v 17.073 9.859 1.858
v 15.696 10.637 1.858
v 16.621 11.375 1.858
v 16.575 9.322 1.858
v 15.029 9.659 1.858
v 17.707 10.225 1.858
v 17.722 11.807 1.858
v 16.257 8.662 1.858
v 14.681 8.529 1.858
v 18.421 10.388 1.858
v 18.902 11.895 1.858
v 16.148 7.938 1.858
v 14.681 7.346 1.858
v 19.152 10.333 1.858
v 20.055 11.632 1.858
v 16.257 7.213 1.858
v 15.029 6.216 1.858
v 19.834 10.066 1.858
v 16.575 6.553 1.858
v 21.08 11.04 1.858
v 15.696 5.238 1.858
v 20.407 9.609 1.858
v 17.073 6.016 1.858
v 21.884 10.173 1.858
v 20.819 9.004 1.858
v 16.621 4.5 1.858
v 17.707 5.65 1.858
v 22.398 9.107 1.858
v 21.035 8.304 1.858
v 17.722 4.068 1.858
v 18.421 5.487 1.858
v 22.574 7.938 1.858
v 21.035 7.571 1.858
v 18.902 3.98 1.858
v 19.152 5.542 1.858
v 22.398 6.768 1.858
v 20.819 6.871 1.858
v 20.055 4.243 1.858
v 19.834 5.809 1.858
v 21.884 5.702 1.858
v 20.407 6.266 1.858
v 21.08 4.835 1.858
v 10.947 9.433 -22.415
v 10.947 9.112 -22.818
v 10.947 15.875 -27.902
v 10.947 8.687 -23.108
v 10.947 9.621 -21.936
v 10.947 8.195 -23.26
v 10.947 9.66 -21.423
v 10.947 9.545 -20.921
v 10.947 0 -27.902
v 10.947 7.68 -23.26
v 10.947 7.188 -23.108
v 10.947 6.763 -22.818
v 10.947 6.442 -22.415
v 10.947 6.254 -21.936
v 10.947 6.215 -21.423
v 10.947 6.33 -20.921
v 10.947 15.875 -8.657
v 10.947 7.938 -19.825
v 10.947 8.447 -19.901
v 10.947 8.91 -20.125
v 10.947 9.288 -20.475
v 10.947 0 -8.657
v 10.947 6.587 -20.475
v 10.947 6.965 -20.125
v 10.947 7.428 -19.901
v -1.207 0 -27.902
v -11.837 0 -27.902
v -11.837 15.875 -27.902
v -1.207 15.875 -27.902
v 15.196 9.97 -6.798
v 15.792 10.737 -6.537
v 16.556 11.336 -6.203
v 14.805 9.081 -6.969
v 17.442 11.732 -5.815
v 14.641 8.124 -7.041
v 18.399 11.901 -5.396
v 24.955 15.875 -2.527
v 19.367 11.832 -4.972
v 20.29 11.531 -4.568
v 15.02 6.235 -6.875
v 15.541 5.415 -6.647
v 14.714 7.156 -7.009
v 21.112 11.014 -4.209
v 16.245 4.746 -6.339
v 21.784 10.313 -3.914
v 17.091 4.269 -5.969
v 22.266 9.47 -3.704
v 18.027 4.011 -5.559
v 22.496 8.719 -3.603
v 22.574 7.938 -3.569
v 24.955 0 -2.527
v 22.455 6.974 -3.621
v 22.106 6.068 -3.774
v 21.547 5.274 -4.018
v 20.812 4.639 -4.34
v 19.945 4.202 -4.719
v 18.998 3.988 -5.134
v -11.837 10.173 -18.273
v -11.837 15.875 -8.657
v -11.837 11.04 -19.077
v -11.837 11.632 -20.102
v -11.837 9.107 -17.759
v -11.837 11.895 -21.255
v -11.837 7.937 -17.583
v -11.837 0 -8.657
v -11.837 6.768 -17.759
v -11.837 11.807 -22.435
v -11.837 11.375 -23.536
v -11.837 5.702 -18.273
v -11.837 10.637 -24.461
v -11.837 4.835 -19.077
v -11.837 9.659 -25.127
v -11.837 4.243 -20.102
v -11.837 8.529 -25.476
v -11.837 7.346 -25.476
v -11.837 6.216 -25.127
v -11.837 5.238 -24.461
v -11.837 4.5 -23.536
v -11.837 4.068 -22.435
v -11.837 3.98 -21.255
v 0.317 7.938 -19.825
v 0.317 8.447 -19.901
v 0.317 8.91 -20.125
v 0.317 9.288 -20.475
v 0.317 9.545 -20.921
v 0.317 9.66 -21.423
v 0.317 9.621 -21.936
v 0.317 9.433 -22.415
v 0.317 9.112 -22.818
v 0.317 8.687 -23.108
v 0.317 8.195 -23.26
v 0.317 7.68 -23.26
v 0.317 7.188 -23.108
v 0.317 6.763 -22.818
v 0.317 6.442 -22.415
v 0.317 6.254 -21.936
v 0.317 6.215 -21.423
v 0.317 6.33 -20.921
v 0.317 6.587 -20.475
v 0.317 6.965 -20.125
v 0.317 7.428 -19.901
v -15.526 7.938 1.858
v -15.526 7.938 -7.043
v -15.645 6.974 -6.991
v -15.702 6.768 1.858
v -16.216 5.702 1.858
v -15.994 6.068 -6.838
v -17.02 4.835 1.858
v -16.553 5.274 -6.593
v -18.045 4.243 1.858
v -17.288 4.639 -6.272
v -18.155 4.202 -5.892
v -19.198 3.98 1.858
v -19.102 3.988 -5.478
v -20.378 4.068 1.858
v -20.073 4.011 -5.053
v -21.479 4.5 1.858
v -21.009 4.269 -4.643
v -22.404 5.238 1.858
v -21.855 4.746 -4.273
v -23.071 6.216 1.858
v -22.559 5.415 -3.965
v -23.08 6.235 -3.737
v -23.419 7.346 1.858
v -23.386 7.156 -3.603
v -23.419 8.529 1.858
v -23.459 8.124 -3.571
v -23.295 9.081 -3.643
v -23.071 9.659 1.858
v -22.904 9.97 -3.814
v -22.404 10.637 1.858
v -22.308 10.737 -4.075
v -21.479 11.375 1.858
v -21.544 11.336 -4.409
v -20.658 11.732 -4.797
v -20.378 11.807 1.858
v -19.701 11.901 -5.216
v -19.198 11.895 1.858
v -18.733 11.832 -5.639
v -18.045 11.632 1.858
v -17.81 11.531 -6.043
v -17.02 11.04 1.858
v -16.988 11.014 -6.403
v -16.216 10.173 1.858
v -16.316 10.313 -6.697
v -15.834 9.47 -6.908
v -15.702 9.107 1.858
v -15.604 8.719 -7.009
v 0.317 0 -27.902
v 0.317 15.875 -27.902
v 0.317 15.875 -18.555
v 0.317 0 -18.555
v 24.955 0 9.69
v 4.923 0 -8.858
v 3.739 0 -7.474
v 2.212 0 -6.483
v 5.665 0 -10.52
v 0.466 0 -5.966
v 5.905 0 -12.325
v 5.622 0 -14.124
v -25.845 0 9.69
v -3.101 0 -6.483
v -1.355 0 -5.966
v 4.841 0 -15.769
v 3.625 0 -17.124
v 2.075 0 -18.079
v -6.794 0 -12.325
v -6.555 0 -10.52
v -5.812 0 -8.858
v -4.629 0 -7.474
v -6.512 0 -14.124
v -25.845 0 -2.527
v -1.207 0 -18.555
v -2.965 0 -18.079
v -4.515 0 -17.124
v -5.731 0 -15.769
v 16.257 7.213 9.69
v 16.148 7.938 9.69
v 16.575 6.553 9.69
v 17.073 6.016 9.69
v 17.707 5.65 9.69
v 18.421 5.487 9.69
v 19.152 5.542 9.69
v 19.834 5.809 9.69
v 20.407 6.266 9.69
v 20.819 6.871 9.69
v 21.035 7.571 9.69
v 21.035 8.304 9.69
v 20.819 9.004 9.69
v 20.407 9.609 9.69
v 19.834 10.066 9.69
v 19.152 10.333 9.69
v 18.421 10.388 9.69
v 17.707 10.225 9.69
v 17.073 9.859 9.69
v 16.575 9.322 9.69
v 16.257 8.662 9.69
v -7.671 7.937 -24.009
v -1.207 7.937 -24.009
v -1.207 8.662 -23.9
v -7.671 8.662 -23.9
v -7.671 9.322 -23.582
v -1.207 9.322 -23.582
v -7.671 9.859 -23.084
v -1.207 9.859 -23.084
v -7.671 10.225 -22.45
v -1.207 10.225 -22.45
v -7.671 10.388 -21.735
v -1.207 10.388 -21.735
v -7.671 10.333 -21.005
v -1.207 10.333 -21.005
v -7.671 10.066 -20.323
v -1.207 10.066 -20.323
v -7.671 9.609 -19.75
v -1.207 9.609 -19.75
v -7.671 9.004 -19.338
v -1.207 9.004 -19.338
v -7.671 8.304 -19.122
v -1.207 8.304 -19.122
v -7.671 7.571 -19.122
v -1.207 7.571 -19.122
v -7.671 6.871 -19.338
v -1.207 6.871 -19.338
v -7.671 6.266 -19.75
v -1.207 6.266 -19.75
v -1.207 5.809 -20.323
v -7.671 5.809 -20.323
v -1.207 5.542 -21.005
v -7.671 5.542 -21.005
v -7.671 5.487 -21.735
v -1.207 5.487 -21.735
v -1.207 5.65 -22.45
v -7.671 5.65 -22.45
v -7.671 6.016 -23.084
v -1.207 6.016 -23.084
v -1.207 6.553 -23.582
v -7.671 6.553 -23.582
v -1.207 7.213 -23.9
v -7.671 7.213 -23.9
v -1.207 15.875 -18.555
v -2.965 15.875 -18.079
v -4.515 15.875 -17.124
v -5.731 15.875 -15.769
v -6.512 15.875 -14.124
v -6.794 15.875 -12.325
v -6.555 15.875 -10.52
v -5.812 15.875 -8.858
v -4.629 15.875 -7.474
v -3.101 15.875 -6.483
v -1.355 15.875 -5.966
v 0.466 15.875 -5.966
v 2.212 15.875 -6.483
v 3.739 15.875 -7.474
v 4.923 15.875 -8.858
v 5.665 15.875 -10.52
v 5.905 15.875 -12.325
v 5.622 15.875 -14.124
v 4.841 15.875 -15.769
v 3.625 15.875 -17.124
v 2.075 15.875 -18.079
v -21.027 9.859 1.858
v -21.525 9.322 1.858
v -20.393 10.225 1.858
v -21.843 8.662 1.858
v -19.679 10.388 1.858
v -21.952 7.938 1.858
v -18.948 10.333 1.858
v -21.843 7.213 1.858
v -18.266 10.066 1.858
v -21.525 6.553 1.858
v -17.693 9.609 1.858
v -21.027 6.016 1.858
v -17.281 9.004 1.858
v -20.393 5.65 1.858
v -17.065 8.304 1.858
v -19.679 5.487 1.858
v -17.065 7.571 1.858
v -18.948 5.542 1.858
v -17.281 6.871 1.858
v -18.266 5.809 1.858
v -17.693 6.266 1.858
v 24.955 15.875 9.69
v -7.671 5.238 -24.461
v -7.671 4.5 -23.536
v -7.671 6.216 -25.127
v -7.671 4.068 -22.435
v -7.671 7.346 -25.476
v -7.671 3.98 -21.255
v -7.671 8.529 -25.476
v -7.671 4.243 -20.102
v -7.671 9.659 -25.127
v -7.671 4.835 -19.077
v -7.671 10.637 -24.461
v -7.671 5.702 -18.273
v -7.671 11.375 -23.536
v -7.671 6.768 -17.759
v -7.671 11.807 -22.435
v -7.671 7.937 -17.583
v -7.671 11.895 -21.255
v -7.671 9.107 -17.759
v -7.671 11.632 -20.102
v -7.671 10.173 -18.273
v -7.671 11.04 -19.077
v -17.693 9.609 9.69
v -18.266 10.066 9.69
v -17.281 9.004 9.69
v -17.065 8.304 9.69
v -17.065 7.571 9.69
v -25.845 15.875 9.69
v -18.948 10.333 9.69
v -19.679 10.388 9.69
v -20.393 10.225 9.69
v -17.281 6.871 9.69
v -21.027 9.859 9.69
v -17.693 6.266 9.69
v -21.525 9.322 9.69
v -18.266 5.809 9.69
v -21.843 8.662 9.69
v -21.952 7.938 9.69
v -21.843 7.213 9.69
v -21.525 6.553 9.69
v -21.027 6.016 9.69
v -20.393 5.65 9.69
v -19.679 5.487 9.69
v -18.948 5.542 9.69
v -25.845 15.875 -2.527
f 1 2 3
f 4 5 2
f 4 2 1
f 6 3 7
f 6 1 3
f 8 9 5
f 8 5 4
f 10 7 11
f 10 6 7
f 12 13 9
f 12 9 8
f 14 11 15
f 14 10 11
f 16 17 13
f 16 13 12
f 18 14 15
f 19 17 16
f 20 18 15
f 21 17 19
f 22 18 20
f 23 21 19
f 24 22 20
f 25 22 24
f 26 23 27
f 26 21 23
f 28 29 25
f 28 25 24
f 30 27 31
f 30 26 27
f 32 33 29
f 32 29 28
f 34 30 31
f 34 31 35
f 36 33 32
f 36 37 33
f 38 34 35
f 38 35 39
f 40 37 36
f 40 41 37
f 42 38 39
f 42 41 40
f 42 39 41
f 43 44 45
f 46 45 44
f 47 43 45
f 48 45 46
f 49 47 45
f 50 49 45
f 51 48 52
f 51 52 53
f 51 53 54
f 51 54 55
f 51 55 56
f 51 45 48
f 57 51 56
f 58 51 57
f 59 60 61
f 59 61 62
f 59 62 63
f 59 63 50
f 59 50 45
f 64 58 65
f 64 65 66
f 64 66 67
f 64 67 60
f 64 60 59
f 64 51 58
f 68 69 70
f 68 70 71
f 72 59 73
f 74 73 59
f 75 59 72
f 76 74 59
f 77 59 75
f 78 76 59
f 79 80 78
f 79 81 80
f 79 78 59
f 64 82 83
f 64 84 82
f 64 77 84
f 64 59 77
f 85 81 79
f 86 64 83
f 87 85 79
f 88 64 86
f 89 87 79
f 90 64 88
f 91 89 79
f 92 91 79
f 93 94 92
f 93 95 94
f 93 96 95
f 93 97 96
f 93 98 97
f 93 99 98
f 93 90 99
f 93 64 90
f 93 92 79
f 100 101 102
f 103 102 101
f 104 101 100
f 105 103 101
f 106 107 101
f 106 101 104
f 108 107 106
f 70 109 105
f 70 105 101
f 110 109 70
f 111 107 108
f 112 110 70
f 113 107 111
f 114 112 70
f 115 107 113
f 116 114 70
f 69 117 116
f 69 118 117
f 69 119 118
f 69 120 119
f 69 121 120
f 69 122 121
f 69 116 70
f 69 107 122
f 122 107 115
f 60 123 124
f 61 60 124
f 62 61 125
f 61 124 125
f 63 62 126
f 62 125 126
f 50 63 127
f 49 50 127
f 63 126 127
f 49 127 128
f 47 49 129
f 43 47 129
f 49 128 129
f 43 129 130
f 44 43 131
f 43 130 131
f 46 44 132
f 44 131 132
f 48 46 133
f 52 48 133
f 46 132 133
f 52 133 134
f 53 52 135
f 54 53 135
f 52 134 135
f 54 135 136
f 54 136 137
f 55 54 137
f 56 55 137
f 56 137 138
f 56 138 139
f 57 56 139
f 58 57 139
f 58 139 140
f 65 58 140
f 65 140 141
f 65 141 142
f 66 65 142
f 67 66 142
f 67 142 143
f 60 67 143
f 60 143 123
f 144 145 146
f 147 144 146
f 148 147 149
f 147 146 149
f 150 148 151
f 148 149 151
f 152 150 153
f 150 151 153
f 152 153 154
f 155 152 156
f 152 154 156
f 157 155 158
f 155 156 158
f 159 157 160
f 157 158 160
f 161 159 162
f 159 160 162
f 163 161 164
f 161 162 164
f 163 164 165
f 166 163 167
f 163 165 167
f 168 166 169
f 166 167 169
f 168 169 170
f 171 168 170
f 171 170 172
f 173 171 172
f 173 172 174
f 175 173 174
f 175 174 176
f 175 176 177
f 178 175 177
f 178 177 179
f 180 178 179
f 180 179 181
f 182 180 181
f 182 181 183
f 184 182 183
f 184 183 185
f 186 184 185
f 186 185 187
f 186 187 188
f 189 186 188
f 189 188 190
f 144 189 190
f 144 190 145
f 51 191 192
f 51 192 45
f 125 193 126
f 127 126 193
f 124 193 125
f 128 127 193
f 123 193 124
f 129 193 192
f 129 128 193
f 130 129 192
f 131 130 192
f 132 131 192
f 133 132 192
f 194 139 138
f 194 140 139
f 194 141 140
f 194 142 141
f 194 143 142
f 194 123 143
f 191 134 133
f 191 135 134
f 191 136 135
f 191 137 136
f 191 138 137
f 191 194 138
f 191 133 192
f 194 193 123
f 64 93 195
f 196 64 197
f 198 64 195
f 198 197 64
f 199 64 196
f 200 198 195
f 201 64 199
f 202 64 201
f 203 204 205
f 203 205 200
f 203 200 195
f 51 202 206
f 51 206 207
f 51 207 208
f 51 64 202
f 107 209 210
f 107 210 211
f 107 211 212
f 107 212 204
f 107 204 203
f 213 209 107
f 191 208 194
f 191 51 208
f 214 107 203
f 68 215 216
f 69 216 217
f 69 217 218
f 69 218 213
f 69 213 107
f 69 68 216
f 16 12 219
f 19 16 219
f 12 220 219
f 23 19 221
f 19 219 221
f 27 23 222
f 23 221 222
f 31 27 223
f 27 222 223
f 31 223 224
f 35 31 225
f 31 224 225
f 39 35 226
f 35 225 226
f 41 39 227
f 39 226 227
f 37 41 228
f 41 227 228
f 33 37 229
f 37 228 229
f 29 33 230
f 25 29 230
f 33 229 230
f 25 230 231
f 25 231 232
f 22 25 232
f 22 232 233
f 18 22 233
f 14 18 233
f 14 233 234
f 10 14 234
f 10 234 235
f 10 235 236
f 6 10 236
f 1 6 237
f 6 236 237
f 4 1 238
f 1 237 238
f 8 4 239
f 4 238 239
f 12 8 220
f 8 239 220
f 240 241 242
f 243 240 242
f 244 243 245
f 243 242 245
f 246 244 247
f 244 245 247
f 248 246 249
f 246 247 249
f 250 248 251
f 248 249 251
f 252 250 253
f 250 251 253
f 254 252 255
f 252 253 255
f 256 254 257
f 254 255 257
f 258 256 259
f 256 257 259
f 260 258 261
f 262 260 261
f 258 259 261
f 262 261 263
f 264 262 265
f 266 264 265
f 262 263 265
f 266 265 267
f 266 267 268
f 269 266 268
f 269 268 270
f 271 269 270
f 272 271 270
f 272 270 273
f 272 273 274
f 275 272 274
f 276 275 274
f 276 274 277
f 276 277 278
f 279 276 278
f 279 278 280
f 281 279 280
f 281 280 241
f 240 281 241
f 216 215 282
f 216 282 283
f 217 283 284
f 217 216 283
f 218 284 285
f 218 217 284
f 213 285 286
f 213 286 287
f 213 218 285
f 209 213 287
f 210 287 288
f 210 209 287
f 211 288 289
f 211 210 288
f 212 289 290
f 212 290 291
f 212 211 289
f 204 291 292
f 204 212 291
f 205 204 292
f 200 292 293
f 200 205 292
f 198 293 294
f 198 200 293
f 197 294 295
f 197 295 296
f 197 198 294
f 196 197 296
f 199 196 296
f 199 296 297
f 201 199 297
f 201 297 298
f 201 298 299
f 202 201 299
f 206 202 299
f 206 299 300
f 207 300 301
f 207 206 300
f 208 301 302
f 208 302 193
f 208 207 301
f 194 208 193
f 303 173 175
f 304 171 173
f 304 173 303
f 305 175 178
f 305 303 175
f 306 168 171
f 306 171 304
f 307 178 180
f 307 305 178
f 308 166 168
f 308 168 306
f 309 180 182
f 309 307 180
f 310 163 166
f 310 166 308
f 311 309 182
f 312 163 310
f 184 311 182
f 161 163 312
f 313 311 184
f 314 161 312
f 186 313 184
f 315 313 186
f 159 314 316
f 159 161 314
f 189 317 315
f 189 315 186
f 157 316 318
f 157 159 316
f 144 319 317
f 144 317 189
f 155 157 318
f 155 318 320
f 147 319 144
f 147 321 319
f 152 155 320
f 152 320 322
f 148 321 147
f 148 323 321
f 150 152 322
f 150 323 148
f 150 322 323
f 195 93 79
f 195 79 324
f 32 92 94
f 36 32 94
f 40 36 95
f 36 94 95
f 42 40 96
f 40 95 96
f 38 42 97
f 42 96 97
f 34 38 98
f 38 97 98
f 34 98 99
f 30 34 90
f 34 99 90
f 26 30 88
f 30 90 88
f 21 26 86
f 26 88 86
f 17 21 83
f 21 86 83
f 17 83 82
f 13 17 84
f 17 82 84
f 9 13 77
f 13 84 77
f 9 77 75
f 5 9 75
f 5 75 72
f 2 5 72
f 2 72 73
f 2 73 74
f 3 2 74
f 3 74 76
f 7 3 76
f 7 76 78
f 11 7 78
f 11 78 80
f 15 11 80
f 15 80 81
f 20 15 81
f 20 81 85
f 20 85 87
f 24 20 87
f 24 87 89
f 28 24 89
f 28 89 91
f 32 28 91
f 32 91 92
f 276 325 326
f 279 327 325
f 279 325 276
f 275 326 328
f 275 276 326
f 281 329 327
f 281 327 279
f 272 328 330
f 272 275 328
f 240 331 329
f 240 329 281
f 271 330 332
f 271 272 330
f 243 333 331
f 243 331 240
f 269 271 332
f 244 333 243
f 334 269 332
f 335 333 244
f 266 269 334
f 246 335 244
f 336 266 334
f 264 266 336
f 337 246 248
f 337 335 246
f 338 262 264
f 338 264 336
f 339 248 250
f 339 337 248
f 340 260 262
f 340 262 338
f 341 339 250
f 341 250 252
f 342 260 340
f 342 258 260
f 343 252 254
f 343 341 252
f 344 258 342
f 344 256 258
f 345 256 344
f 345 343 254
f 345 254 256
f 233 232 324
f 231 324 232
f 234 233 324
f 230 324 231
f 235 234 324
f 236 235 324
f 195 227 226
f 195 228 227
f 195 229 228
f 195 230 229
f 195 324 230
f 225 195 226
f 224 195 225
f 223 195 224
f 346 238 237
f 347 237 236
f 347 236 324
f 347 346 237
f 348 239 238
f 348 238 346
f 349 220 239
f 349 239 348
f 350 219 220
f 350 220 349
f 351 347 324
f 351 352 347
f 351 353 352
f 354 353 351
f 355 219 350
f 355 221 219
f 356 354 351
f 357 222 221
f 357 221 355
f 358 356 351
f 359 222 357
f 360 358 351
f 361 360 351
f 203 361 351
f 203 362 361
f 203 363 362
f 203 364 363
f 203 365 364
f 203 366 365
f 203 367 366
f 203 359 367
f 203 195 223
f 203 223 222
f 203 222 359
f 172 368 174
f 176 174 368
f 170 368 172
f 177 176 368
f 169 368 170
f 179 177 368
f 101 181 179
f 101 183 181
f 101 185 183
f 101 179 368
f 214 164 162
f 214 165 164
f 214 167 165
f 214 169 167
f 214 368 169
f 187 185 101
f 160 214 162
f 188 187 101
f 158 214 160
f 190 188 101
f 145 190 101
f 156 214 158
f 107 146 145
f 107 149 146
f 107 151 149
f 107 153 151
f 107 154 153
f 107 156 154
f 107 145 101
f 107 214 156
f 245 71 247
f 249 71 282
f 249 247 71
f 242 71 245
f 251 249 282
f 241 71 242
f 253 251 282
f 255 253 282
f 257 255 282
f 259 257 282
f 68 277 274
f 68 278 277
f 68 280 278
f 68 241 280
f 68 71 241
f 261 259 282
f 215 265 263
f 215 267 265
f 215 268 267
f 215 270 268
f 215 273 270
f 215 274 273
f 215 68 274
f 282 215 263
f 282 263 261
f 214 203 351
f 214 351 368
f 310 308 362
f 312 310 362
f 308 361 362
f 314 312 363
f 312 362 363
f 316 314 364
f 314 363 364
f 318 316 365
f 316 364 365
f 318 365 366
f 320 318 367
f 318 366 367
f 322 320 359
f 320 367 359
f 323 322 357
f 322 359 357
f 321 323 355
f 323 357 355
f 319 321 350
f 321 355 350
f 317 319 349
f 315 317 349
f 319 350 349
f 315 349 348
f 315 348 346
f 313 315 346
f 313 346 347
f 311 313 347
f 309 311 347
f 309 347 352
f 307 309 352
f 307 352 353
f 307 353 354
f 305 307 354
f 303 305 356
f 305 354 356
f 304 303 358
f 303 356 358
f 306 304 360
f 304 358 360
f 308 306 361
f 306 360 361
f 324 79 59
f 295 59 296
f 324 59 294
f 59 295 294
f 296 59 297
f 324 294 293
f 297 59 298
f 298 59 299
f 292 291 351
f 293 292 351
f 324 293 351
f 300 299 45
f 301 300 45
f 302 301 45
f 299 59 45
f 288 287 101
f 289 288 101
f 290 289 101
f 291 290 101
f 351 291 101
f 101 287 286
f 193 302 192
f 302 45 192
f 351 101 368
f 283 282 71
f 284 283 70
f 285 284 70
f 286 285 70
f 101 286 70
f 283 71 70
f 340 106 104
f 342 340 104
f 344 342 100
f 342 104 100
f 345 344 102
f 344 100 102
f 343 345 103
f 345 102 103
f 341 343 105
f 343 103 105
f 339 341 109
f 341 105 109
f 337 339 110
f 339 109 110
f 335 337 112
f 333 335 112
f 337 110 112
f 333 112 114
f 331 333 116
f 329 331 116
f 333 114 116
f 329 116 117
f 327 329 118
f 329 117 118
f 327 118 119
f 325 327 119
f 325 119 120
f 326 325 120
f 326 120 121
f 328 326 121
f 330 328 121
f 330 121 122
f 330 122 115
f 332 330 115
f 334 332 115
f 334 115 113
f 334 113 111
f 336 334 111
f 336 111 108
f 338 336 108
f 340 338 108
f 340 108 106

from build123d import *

# Parameters (mm, degrees)
BOSS_EXTRUDE1_DEPTH                            = 15.875
F_8_32_TAPPED_HOLE1_D                          = 3.4544
F_8_32_TAPPED_HOLE1_DEPTH                      = 10.6299
CBORE_FOR_8_SOCKET_HEAD_CAP_SCREW1_D           = 4.9149
CBORE_FOR_8_SOCKET_HEAD_CAP_SCREW1_DEPTH       = 10.6299
CBORE_FOR_8_SOCKET_HEAD_CAP_SCREW1_CBORE_D     = 7.9375
CBORE_FOR_8_SOCKET_HEAD_CAP_SCREW1_CBORE_DEPTH = 4.1656
CBORE_FOR_8_SOCKET_HEAD_CAP_SCREW2_D           = 4.9149
CBORE_FOR_8_SOCKET_HEAD_CAP_SCREW2_CBORE_D     = 7.9375
CBORE_FOR_8_SOCKET_HEAD_CAP_SCREW2_CBORE_DEPTH = 10.5156


with BuildPart() as part:
    # Sketch1 → Boss-Extrude1 (new body)
    with BuildSketch(Plane(origin=(0, 0, 0), x_dir=(1, 0, 0), z_dir=(0, 1, 0))):
        with BuildLine():
            Line((-11.836826281, 27.901732418), (-1.206926281, 27.901732418))
            Line((-1.206926281, 27.901732418), (-1.206926281, 18.554532418))
            ThreePointArc((-1.206926281, 18.554532418), (-0.444926281, 5.900418206), (0.317073719, 18.554532418))
            Line((0.317073719, 18.554532418), (0.317073719, 27.901732418))
            Line((0.317073719, 27.901732418), (10.946973719, 27.901732418))
            Line((10.946973719, 27.901732418), (10.946973719, 8.657386186))
            Line((10.946973719, 8.657386186), (24.955073719, 2.526772877))
            Line((24.955073719, 2.526772877), (24.955073719, -9.690267582))
            Line((24.955073719, -9.690267582), (-25.844926281, -9.690267582))
            Line((-25.844926281, -9.690267582), (-25.844926281, 2.526772877))
            Line((-25.844926281, 2.526772877), (-11.836826281, 8.657386186))
            Line((-11.836826281, 8.657386186), (-11.836826281, 27.901732418))
        make_face()
    extrude(amount=BOSS_EXTRUDE1_DEPTH)

    # #8-32 Tapped Hole1
    with Locations(Plane(origin=(10.946973719, 0, 0), x_dir=(0, 0, -1), z_dir=(1, 0, 0))):
        with Locations((21.551732418, 7.9375)):
            Hole(F_8_32_TAPPED_HOLE1_D / 2, depth=F_8_32_TAPPED_HOLE1_DEPTH)

    # CBORE for #8 Socket Head Cap Screw1
    with Locations(Plane.ZY.offset(11.836826281)):
        with Locations((-21.551732418, 7.9375)):
            CounterBoreHole(CBORE_FOR_8_SOCKET_HEAD_CAP_SCREW1_D / 2, CBORE_FOR_8_SOCKET_HEAD_CAP_SCREW1_CBORE_D / 2, CBORE_FOR_8_SOCKET_HEAD_CAP_SCREW1_CBORE_DEPTH, depth=CBORE_FOR_8_SOCKET_HEAD_CAP_SCREW1_DEPTH)

    # CBORE for #8 Socket Head Cap Screw2 (through all)
    with Locations(Plane(origin=(0, 0, -8.657386186), x_dir=(1, 0, 0), z_dir=(0, 0, -1))):
        with Locations((18.605073719, -7.9375), (-19.494926281, -7.9375)):
            CounterBoreHole(CBORE_FOR_8_SOCKET_HEAD_CAP_SCREW2_D / 2, CBORE_FOR_8_SOCKET_HEAD_CAP_SCREW2_CBORE_D / 2, CBORE_FOR_8_SOCKET_HEAD_CAP_SCREW2_CBORE_DEPTH)


solid = part.part
